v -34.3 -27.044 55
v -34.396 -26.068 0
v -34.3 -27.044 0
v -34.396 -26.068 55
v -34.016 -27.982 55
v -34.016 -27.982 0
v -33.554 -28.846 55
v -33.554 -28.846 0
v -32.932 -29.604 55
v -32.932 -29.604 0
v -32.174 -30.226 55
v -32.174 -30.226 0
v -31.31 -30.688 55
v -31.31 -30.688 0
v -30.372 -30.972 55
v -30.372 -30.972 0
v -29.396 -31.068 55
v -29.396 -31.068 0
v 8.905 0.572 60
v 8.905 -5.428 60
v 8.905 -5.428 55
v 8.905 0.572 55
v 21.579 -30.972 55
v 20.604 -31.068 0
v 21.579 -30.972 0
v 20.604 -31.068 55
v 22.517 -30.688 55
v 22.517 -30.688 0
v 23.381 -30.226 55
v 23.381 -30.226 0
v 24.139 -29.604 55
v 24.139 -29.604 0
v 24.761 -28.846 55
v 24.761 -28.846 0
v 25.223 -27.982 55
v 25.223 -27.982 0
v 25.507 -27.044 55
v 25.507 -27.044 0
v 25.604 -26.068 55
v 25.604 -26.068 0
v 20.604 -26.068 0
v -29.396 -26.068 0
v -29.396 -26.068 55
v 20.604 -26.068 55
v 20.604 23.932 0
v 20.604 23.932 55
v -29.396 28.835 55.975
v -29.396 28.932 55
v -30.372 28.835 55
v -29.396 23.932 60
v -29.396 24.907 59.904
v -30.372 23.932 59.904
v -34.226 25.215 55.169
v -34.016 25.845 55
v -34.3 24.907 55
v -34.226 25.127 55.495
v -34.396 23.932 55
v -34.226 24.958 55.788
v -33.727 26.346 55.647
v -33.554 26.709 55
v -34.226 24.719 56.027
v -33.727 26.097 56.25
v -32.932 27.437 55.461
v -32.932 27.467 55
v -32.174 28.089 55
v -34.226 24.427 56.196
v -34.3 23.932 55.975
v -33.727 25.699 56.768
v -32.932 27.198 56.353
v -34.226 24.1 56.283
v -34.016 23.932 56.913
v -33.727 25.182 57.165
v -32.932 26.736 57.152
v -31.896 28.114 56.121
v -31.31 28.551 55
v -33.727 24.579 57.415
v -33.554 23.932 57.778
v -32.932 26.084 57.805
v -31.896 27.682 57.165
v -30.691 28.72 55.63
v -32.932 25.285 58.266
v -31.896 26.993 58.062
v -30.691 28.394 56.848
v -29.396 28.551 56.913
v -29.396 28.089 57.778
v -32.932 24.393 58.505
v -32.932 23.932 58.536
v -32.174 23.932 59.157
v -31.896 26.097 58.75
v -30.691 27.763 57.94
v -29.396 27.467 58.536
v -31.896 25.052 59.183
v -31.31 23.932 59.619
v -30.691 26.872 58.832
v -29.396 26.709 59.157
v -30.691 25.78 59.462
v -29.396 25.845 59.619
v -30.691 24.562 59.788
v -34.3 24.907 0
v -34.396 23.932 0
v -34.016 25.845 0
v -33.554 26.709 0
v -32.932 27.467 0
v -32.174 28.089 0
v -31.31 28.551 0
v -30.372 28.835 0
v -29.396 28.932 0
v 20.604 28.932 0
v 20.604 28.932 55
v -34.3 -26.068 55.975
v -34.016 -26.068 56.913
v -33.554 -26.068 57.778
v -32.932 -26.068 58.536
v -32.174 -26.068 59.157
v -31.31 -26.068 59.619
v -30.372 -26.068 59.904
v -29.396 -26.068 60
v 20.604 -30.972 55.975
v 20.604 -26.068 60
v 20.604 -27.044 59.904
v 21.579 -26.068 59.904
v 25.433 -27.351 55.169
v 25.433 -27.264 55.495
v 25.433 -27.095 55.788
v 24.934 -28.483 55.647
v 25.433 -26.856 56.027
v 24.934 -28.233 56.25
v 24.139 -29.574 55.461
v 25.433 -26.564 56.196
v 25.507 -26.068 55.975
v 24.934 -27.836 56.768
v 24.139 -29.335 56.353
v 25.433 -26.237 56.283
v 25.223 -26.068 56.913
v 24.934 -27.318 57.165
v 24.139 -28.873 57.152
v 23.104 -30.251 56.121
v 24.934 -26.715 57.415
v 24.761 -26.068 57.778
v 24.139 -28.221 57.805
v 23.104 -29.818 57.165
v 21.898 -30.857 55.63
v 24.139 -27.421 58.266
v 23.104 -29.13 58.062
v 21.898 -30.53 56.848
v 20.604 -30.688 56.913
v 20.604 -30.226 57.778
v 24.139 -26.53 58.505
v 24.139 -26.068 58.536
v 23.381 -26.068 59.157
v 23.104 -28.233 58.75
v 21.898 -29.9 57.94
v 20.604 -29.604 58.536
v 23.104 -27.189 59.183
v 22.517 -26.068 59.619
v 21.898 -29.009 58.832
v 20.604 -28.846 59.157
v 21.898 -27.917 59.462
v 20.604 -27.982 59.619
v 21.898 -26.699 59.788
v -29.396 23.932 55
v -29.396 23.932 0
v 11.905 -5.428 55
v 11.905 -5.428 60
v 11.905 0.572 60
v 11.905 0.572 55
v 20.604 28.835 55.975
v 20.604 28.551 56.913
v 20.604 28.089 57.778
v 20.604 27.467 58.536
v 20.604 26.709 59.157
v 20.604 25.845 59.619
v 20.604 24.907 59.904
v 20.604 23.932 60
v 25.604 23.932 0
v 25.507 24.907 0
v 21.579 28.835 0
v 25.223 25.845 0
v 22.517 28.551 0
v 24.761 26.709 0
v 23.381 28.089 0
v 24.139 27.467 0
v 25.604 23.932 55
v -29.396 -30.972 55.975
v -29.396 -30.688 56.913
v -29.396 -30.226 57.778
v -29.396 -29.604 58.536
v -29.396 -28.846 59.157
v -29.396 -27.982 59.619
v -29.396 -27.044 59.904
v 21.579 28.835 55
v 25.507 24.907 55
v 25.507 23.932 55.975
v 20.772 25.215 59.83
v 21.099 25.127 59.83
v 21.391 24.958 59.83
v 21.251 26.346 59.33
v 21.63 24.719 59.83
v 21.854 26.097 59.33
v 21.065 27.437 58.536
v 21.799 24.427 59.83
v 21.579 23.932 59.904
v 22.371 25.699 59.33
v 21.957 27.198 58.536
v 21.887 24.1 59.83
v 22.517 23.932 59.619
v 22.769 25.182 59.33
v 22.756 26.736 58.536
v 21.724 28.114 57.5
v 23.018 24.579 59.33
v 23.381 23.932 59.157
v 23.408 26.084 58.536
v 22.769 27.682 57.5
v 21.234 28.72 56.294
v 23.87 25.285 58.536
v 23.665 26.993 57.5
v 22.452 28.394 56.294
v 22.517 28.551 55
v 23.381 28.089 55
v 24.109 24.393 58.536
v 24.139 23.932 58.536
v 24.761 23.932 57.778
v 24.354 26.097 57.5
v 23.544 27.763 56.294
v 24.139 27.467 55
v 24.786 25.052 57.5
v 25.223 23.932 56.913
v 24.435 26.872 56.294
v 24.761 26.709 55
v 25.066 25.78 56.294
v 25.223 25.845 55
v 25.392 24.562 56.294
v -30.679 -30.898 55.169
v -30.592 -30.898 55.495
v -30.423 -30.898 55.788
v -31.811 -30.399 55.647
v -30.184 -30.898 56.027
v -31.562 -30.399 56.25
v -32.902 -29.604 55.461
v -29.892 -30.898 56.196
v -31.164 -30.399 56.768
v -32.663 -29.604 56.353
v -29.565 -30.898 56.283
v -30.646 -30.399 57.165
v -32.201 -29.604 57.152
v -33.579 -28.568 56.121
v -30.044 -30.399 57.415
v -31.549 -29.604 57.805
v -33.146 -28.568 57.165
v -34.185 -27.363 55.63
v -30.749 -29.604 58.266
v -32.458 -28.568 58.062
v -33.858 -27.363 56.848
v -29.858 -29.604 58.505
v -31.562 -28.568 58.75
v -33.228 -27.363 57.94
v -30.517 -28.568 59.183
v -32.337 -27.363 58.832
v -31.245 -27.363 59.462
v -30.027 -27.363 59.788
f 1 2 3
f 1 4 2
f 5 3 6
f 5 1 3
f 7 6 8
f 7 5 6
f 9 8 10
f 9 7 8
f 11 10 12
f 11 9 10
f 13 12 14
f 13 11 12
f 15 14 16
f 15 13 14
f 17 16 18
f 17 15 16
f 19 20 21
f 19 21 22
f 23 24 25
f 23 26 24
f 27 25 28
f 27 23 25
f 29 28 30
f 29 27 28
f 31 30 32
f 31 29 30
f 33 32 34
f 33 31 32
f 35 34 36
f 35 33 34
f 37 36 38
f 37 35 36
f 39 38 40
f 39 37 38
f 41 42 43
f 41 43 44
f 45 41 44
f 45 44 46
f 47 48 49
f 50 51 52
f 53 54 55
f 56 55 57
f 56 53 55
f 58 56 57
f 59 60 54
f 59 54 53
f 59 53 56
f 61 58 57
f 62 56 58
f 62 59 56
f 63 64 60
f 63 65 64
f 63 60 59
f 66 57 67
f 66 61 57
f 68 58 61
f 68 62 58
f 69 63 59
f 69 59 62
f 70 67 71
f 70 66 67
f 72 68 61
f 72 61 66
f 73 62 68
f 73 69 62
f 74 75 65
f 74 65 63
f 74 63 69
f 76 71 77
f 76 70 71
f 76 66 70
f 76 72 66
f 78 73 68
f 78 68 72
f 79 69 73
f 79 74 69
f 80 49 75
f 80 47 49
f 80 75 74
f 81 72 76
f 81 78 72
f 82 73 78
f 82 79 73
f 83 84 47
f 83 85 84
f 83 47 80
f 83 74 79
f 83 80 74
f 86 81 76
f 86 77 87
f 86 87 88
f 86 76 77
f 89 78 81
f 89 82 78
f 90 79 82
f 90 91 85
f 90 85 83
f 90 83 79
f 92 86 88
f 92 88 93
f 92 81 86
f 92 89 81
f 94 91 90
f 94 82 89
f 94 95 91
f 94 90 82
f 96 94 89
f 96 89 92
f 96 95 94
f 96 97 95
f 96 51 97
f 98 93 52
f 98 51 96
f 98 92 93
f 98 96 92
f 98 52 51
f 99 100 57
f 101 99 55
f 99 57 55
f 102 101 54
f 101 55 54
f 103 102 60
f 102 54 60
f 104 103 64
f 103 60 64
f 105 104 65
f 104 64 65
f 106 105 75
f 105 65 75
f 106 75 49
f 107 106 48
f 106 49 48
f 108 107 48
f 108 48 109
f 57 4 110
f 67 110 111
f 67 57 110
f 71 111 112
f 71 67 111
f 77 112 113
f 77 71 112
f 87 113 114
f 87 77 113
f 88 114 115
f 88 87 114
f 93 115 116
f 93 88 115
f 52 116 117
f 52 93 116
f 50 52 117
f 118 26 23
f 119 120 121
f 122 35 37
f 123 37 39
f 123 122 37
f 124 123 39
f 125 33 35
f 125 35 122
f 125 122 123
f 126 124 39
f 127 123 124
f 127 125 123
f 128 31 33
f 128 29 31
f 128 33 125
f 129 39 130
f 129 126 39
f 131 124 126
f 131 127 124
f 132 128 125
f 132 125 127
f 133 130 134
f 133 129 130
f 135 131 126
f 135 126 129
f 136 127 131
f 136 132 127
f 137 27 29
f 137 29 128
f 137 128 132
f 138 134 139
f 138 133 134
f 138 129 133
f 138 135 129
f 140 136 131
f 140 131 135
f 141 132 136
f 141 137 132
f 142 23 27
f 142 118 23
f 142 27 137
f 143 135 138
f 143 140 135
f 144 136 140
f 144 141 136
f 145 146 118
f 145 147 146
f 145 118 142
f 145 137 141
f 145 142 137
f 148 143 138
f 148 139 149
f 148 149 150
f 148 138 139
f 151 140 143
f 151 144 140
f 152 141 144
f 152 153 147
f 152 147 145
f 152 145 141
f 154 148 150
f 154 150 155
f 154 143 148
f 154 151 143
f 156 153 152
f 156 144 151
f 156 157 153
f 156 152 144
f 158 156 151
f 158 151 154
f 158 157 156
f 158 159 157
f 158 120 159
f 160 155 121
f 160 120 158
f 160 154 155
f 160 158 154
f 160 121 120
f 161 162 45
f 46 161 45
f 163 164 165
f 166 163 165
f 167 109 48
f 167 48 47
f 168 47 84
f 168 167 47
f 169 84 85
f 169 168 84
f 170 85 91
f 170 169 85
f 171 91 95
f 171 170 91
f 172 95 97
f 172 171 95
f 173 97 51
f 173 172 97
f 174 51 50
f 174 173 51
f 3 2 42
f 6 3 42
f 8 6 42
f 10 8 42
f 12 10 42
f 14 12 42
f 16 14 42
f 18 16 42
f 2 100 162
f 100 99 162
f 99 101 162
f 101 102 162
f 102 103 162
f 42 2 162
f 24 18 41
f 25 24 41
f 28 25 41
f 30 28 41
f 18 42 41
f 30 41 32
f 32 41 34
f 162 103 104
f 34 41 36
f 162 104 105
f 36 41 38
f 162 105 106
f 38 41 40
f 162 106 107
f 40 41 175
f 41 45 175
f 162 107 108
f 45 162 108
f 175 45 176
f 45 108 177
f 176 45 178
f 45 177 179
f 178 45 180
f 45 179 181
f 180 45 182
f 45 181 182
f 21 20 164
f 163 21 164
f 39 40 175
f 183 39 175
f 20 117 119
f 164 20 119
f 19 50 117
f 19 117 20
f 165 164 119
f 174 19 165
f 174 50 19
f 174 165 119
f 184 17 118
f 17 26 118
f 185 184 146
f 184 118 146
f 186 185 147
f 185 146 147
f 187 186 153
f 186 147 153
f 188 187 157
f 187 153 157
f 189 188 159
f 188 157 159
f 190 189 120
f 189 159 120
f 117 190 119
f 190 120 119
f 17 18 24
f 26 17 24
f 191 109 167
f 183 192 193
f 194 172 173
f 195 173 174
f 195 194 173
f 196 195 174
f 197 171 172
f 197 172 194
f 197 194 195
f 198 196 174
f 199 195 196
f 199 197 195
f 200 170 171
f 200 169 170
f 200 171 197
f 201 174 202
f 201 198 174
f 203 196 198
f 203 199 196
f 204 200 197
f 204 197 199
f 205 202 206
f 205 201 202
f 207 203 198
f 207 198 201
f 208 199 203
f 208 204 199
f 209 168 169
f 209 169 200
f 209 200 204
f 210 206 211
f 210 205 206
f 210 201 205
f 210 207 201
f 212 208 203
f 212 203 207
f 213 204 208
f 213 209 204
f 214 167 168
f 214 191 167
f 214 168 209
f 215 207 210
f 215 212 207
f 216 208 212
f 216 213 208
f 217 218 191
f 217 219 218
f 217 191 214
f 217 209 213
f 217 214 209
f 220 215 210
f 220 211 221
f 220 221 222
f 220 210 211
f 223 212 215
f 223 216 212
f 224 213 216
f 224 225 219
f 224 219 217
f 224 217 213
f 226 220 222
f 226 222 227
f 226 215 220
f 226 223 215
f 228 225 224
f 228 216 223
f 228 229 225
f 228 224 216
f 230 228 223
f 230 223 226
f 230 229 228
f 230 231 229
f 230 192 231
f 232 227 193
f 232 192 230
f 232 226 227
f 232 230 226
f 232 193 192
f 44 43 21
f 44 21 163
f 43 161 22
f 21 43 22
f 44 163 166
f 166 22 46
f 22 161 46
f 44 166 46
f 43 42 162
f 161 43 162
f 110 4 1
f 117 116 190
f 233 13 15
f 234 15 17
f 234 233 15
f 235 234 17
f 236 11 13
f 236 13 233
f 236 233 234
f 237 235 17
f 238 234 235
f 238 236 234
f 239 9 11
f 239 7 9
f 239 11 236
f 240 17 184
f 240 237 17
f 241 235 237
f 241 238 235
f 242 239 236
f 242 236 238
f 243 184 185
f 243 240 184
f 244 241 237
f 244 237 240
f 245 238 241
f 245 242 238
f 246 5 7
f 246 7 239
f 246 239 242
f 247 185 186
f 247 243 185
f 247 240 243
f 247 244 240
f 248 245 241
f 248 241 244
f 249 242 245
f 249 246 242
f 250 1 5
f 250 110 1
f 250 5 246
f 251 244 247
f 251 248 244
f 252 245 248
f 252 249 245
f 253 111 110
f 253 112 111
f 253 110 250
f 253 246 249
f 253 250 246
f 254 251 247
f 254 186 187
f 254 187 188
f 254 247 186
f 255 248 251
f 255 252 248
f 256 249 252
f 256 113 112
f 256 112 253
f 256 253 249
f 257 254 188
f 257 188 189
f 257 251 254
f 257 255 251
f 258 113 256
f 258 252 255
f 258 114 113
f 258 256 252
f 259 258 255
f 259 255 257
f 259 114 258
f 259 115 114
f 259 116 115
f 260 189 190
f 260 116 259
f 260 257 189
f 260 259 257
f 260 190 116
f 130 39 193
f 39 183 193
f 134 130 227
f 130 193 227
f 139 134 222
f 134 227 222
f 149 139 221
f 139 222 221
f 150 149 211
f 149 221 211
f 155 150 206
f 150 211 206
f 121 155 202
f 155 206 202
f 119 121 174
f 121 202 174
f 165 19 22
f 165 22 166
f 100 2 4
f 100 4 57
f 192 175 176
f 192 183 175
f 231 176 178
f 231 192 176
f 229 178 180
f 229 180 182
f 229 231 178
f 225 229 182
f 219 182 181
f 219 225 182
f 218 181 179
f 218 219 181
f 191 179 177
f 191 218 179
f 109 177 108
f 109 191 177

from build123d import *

# Parameters (mm, degrees)
F0_W     = 60
F0_H     = 60
F1_DEPTH = 60
F2_R     = 5
F3_T     = 5
F4_W     = 3
F4_H     = 6
F5_DEPTH = 25


# Not quite as in the source:
# - a shell that OpenCascade refuses in one call is made with other operations: the cavity is built on its own and cut out


with BuildPart() as f1:
    # F0 (on Top) → F1 (new body)
    with BuildSketch(Plane.XY):
        with Locations((-4.3964601223, -1.0684304871)):
            Rectangle(F0_W, F0_H)
    extrude(amount=F1_DEPTH)

    # F2
    f2_edges = [f1.edges().sort_by_distance(p)[0] for p in [
        (25.60354, 28.93157, 30),
        (-4.39646, 28.93157, 60),
        (-34.39646, 28.93157, 30),
        (-34.39646, -1.06843, 60),
        (-34.39646, -31.06843, 30),
        (-4.39646, -31.06843, 60),
        (25.60354, -31.06843, 30),
        (25.60354, -1.06843, 60),
    ]]
    fillet(f2_edges, radius=F2_R)

    # F3: shell of thickness 5, made by hand


with BuildPart() as f3_core1:
    # F3_t2: copy of F1
    add(f1.part)

    # the walls: a layer under each face that stays
    f3_faces = [f3_core1.faces().sort_by_distance(p)[0] for p in [
        (-4.3964601223, 28.9315695129, 27.5),
        (25.6035398777, -1.0684304871, 27.5),
        (-34.3964601223, -1.0684304871, 27.5),
        (-4.3964601223, -31.0684304871, 27.5),
        (-4.3964601223, -1.0684304871, 60),
    ]]
    thicken(f3_faces, amount=-F3_T, mode=Mode.SUBTRACT)


with BuildPart() as f1_1:
    add(f1.part)

    # what is left inside the walls is the cavity
    f3_cavity = [f3_core1.part.solids().sort_by_distance(p)[0] for p in [
        (20.55354, -1.06843, 36.666667),
    ]]
    add(f3_cavity, mode=Mode.SUBTRACT)

    # F4 (on face) → F5 (cut)
    with BuildSketch(Plane.XY.offset(60)):
        with Locations((10.4050671086, -2.4284604266)):
            Rectangle(F4_W, F4_H)
    extrude(amount=-F5_DEPTH, mode=Mode.SUBTRACT)


solid = f1_1.part
